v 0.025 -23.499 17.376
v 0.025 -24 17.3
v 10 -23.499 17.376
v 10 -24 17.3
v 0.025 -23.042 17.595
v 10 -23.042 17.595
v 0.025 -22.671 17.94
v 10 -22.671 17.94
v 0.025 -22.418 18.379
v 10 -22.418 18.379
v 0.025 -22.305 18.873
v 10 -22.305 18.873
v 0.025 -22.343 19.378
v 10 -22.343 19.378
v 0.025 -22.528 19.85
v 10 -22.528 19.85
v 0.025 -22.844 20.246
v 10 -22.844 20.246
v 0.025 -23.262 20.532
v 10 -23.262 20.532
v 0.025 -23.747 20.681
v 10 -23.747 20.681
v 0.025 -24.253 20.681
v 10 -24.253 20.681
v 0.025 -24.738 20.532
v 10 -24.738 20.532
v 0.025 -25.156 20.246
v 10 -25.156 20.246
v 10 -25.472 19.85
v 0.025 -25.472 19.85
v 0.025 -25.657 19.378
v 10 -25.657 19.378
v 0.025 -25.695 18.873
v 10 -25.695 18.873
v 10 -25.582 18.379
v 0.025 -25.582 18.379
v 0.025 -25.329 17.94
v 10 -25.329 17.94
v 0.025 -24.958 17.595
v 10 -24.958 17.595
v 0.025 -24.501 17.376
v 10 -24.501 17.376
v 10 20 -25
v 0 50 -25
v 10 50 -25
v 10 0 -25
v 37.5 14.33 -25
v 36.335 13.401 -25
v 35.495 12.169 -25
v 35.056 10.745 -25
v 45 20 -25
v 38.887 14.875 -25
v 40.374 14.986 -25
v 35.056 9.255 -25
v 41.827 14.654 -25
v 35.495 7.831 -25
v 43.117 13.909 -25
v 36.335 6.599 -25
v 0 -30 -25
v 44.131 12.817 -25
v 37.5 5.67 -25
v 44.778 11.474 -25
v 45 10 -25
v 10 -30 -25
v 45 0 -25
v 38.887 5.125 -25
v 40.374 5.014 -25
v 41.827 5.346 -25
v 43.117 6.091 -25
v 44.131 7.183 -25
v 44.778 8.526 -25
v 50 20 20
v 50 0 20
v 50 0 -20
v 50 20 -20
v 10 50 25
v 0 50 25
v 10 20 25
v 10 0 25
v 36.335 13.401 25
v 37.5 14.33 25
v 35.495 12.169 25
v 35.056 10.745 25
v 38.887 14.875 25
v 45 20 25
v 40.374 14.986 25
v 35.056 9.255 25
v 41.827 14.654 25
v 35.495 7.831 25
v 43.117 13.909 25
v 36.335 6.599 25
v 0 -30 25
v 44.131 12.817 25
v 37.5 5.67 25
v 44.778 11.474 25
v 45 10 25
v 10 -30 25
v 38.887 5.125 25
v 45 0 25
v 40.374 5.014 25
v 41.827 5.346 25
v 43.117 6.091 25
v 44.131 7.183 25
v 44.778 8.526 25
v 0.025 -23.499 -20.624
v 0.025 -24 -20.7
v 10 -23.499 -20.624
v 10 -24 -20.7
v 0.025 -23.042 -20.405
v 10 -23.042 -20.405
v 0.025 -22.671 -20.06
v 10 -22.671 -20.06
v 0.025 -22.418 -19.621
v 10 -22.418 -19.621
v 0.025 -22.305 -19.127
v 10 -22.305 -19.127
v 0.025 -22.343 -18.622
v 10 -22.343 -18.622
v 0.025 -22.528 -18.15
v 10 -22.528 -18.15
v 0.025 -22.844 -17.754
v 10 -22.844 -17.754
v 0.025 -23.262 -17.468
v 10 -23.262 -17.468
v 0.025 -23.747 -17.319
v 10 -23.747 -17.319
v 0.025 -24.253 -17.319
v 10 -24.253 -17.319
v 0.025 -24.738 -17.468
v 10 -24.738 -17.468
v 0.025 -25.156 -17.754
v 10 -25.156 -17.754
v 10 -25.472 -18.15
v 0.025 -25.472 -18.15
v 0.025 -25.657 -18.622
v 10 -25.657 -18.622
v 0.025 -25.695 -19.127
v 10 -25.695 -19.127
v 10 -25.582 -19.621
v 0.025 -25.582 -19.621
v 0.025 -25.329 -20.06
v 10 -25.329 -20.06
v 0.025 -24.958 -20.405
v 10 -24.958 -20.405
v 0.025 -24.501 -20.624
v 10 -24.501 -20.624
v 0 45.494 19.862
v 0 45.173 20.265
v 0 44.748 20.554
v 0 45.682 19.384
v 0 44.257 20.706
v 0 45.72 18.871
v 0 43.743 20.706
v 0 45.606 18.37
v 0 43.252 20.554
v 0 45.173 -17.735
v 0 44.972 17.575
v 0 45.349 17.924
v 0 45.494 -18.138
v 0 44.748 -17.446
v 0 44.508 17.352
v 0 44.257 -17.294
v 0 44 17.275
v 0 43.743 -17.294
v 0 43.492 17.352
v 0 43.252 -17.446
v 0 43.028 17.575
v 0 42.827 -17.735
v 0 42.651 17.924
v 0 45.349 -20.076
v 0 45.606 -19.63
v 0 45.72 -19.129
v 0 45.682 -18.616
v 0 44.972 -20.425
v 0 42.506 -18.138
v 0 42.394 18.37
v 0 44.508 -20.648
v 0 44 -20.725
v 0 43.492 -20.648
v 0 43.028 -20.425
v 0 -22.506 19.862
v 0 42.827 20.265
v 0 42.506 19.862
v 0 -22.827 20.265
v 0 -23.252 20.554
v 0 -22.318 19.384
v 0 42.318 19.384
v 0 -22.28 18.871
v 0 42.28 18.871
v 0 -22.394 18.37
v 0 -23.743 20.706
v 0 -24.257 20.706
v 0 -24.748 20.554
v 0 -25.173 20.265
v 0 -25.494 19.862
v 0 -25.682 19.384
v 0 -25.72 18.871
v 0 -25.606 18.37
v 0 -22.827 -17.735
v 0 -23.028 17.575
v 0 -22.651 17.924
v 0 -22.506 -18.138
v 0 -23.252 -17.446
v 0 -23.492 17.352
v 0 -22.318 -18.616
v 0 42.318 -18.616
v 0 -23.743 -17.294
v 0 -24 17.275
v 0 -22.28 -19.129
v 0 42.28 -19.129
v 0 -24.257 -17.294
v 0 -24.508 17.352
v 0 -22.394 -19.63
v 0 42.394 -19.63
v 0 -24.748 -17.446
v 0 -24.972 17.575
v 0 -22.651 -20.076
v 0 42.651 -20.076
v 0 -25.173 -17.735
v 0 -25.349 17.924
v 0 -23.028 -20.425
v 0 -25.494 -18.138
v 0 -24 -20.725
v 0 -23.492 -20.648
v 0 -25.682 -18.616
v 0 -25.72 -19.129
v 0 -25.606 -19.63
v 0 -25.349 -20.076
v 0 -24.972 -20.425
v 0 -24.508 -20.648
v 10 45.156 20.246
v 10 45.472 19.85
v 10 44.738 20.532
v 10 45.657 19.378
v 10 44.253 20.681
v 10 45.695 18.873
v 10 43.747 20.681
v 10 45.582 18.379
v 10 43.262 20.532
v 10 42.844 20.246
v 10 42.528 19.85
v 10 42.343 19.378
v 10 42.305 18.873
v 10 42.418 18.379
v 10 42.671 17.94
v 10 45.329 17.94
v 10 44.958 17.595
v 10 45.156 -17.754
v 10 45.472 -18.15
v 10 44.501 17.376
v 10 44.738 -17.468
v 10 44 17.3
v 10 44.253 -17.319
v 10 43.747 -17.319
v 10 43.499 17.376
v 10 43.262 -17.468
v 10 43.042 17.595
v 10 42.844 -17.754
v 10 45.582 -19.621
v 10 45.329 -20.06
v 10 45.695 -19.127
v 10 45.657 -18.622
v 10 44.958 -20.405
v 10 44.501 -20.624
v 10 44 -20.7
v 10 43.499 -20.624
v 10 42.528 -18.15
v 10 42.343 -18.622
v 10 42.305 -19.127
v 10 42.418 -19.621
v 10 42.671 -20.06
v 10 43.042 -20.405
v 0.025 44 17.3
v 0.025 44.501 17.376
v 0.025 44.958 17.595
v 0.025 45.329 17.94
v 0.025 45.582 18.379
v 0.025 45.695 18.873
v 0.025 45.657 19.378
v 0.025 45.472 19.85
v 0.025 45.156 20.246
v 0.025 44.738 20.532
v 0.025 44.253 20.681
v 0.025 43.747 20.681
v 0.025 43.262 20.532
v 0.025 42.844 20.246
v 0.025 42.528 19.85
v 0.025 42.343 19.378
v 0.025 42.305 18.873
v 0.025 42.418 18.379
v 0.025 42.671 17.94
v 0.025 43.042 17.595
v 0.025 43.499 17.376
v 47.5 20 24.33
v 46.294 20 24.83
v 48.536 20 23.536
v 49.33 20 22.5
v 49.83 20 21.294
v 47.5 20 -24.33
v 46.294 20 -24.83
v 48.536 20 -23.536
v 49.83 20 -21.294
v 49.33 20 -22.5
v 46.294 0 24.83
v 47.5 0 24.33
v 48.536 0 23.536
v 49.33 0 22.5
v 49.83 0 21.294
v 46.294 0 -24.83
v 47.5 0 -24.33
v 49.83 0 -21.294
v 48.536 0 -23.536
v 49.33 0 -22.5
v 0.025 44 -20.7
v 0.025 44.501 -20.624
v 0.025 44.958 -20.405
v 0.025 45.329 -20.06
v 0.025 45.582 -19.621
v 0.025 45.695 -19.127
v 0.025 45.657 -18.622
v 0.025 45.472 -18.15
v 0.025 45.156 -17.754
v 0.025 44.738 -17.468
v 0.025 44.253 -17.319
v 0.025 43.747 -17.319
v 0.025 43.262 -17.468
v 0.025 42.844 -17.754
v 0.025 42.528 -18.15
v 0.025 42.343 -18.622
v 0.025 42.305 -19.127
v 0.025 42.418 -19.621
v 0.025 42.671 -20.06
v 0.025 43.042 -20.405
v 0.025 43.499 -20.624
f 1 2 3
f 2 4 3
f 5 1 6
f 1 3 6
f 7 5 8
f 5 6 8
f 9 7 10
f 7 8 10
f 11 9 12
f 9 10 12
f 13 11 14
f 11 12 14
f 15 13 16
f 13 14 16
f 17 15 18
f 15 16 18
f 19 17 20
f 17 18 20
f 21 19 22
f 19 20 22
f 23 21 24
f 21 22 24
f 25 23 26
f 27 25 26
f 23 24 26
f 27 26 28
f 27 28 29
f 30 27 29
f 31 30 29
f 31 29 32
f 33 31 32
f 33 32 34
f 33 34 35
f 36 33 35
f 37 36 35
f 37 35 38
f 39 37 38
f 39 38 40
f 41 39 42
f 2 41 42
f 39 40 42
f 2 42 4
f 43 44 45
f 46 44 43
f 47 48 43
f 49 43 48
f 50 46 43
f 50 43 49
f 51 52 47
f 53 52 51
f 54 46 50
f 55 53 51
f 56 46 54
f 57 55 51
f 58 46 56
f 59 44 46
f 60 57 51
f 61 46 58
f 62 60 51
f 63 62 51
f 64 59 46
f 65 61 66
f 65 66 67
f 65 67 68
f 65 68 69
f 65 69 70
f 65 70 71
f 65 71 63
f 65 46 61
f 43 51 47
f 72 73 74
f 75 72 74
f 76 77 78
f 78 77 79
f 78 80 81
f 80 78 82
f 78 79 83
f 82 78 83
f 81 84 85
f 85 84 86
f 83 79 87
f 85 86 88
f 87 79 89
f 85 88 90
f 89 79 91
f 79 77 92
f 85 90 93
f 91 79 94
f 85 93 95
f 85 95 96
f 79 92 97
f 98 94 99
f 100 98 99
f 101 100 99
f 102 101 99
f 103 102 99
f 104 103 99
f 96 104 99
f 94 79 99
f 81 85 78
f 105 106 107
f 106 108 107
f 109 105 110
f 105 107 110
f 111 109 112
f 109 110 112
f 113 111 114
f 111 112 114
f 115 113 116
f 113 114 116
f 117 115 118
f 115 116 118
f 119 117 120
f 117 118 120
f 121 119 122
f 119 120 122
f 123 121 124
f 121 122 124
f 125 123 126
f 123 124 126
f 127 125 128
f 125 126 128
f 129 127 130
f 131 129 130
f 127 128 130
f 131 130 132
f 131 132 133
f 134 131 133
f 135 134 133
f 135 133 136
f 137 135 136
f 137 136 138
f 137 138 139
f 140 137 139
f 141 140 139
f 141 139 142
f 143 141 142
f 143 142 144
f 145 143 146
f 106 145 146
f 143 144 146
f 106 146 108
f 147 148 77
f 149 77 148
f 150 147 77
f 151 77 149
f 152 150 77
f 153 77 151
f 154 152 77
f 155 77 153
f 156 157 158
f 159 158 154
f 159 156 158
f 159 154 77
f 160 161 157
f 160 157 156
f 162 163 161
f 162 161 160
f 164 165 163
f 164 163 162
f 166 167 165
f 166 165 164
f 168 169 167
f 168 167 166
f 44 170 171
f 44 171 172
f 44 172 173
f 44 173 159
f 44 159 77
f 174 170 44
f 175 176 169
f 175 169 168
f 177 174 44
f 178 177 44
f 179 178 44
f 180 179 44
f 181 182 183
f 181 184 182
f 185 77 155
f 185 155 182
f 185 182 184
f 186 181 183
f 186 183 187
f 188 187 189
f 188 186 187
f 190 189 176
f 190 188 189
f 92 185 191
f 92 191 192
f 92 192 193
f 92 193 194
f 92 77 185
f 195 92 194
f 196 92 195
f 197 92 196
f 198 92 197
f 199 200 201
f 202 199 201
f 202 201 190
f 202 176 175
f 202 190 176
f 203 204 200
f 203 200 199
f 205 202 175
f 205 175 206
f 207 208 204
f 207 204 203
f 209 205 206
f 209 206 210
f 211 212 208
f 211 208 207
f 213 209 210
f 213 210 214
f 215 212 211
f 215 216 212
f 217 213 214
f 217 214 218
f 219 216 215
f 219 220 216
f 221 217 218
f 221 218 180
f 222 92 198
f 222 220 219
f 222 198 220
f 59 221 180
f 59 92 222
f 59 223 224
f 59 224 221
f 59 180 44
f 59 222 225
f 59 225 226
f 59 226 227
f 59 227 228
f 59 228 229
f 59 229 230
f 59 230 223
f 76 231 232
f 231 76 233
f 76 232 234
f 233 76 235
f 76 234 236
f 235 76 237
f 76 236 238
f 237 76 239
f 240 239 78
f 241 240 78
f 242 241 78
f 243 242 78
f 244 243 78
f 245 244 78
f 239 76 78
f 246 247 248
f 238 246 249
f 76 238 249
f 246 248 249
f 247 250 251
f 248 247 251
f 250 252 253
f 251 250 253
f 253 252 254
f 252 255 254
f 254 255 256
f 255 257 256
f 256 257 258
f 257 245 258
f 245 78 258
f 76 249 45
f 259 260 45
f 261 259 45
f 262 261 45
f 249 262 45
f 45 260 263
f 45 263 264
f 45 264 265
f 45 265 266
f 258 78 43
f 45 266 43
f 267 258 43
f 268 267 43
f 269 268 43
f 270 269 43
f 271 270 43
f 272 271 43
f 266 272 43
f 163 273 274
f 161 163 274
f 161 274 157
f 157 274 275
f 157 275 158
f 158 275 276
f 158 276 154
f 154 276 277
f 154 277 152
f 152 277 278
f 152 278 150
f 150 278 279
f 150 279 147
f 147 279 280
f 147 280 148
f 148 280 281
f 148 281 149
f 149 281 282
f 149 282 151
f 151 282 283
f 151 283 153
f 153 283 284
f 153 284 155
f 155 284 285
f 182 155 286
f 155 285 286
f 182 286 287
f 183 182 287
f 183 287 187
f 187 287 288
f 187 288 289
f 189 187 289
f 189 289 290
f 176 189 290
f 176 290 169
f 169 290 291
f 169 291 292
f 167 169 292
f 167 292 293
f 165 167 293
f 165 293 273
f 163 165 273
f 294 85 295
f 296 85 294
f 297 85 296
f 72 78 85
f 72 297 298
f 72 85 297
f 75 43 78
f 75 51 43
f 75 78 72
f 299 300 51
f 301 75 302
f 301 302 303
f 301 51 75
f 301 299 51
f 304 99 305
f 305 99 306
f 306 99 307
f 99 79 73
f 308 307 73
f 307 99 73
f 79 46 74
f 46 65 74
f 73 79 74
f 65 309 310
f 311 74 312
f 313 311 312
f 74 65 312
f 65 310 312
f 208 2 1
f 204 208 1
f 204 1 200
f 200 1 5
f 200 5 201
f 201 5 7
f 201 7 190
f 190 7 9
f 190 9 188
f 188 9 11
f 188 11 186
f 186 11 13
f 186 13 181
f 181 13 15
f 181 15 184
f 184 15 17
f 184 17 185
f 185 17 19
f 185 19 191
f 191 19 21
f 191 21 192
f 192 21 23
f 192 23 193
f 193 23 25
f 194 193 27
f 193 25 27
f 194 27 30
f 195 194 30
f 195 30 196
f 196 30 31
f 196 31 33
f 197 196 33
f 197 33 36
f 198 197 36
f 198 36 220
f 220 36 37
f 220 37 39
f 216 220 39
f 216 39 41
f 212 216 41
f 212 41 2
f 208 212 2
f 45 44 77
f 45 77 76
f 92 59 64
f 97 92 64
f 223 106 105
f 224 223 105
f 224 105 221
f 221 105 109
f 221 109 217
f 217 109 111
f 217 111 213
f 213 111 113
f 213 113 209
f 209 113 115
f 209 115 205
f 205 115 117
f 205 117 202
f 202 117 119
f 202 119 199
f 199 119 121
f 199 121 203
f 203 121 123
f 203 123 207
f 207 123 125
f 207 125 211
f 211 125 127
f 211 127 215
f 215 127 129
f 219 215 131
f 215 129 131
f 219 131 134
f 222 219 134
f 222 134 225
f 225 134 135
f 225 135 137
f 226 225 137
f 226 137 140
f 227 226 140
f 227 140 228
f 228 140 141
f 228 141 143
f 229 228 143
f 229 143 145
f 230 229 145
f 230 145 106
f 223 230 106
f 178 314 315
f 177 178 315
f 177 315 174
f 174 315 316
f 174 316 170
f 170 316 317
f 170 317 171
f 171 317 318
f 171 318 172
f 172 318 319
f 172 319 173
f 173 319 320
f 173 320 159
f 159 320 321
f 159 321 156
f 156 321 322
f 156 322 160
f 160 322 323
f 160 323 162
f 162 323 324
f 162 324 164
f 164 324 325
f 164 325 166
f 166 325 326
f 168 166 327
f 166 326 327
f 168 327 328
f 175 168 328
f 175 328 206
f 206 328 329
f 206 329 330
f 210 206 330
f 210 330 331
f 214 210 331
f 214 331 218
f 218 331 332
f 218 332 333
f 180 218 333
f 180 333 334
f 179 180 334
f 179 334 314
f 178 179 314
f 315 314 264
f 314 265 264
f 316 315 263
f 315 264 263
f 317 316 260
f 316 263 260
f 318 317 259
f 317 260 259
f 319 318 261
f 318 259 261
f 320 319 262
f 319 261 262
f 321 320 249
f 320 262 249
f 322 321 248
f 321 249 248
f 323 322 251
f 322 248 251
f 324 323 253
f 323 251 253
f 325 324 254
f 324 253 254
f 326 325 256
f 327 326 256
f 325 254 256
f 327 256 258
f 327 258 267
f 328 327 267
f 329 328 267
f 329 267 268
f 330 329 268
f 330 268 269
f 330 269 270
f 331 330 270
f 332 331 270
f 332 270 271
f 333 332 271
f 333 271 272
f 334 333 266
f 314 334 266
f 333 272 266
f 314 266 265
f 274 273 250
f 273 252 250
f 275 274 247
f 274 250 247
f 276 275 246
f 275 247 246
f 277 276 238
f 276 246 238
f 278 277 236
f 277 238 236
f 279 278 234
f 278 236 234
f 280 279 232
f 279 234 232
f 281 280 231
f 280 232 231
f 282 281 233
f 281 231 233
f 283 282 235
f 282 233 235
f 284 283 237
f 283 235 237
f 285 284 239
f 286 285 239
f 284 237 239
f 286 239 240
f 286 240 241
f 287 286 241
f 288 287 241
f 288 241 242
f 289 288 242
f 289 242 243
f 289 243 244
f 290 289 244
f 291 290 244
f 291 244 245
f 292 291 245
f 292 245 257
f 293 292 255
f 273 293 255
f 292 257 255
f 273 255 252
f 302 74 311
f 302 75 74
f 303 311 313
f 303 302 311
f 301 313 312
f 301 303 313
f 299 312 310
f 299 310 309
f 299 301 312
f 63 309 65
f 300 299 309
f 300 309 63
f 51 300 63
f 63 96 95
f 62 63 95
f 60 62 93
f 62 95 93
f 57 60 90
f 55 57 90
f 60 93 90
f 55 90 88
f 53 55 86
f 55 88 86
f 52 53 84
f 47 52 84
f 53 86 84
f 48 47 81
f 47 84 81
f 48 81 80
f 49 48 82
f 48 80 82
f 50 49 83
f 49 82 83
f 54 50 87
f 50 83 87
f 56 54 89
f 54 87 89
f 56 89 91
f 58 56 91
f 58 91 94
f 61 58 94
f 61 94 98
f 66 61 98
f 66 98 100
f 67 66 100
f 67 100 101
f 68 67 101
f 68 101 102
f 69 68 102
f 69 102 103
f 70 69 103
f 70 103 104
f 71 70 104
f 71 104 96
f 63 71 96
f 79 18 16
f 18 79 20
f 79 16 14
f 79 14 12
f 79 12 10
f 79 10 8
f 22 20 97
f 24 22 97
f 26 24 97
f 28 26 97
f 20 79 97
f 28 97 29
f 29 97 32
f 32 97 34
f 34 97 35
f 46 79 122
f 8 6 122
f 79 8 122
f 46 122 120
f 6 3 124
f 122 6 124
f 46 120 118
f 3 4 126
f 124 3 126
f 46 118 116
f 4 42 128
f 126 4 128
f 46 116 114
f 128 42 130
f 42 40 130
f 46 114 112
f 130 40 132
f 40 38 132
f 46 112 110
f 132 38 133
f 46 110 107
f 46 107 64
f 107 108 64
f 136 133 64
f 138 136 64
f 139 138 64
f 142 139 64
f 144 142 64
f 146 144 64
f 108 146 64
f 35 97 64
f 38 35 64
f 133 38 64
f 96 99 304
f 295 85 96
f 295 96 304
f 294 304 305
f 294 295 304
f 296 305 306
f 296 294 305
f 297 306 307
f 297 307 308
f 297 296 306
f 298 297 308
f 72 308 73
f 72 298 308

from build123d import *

# Parameters (mm, degrees)
SKETCH1_W                      = 50
SKETCH1_H                      = 50
BOSS_EXTRUDE1_DEPTH            = 20
FILLET1_R                      = 5
CUT_EXTRUDE1_REACH             = 75.485
SKETCH2_R                      = 5
BOSS_EXTRUDE2_DEPTH            = 40
BOSS_EXTRUDE2_DEPTH_BACK       = 40
SKETCH3_W                      = 10
SKETCH3_H                      = 50
M3_CLEARANCE_HOLE1_D           = 3.4
M3_CLEARANCE_HOLE1_CSINK_D     = 3.45
M3_CLEARANCE_HOLE1_CSINK_ANGLE = 90


with BuildPart() as part:
    # Sketch1 → Boss-Extrude1 (new body)
    with BuildSketch(Plane(origin=(0, 0, 0), x_dir=(1, 0, 0), z_dir=(0, 1, 0))):
        with Locations((25, 0)):
            Rectangle(SKETCH1_W, SKETCH1_H)
    extrude(amount=BOSS_EXTRUDE1_DEPTH)

    # Fillet1
    fillet1_edges = [part.edges().sort_by_distance(p)[0] for p in [
        (50, 10, -25),
        (50, 10, 25),
    ]]
    fillet(fillet1_edges, radius=FILLET1_R)

    # Sketch2 → Cut-Extrude1 (cut, up to next)
    with BuildSketch(Plane.XY.offset(25), mode=Mode.PRIVATE) as cut_extrude1_sk1:
        with Locations((40, 10)):
            Circle(SKETCH2_R)
    cut_extrude1_tool1 = extrude(cut_extrude1_sk1.sketch, amount=-CUT_EXTRUDE1_REACH, mode=Mode.PRIVATE) & part.part
    add(cut_extrude1_tool1.solids().sort_by_distance((40, 10, 25))[0], mode=Mode.SUBTRACT)

    # Sketch3 → Boss-Extrude2 (add, two sides: drawn at the far end of the back side and taken through both)
    with BuildSketch(Plane(origin=(0, 10, 0), x_dir=(1, 0, 0), z_dir=(0, 1, 0)).offset(-BOSS_EXTRUDE2_DEPTH_BACK)):
        with Locations((5, 0)):
            Rectangle(SKETCH3_W, SKETCH3_H)
    extrude(amount=BOSS_EXTRUDE2_DEPTH + BOSS_EXTRUDE2_DEPTH_BACK)

    # M3 Clearance Hole1 (through all)
    with Locations(Plane.ZY):
        with Locations((-19, 44), (19, 44), (-19, -24), (19, -24)):
            CounterSinkHole(M3_CLEARANCE_HOLE1_D / 2, M3_CLEARANCE_HOLE1_CSINK_D / 2, counter_sink_angle=M3_CLEARANCE_HOLE1_CSINK_ANGLE)


solid = part.part
